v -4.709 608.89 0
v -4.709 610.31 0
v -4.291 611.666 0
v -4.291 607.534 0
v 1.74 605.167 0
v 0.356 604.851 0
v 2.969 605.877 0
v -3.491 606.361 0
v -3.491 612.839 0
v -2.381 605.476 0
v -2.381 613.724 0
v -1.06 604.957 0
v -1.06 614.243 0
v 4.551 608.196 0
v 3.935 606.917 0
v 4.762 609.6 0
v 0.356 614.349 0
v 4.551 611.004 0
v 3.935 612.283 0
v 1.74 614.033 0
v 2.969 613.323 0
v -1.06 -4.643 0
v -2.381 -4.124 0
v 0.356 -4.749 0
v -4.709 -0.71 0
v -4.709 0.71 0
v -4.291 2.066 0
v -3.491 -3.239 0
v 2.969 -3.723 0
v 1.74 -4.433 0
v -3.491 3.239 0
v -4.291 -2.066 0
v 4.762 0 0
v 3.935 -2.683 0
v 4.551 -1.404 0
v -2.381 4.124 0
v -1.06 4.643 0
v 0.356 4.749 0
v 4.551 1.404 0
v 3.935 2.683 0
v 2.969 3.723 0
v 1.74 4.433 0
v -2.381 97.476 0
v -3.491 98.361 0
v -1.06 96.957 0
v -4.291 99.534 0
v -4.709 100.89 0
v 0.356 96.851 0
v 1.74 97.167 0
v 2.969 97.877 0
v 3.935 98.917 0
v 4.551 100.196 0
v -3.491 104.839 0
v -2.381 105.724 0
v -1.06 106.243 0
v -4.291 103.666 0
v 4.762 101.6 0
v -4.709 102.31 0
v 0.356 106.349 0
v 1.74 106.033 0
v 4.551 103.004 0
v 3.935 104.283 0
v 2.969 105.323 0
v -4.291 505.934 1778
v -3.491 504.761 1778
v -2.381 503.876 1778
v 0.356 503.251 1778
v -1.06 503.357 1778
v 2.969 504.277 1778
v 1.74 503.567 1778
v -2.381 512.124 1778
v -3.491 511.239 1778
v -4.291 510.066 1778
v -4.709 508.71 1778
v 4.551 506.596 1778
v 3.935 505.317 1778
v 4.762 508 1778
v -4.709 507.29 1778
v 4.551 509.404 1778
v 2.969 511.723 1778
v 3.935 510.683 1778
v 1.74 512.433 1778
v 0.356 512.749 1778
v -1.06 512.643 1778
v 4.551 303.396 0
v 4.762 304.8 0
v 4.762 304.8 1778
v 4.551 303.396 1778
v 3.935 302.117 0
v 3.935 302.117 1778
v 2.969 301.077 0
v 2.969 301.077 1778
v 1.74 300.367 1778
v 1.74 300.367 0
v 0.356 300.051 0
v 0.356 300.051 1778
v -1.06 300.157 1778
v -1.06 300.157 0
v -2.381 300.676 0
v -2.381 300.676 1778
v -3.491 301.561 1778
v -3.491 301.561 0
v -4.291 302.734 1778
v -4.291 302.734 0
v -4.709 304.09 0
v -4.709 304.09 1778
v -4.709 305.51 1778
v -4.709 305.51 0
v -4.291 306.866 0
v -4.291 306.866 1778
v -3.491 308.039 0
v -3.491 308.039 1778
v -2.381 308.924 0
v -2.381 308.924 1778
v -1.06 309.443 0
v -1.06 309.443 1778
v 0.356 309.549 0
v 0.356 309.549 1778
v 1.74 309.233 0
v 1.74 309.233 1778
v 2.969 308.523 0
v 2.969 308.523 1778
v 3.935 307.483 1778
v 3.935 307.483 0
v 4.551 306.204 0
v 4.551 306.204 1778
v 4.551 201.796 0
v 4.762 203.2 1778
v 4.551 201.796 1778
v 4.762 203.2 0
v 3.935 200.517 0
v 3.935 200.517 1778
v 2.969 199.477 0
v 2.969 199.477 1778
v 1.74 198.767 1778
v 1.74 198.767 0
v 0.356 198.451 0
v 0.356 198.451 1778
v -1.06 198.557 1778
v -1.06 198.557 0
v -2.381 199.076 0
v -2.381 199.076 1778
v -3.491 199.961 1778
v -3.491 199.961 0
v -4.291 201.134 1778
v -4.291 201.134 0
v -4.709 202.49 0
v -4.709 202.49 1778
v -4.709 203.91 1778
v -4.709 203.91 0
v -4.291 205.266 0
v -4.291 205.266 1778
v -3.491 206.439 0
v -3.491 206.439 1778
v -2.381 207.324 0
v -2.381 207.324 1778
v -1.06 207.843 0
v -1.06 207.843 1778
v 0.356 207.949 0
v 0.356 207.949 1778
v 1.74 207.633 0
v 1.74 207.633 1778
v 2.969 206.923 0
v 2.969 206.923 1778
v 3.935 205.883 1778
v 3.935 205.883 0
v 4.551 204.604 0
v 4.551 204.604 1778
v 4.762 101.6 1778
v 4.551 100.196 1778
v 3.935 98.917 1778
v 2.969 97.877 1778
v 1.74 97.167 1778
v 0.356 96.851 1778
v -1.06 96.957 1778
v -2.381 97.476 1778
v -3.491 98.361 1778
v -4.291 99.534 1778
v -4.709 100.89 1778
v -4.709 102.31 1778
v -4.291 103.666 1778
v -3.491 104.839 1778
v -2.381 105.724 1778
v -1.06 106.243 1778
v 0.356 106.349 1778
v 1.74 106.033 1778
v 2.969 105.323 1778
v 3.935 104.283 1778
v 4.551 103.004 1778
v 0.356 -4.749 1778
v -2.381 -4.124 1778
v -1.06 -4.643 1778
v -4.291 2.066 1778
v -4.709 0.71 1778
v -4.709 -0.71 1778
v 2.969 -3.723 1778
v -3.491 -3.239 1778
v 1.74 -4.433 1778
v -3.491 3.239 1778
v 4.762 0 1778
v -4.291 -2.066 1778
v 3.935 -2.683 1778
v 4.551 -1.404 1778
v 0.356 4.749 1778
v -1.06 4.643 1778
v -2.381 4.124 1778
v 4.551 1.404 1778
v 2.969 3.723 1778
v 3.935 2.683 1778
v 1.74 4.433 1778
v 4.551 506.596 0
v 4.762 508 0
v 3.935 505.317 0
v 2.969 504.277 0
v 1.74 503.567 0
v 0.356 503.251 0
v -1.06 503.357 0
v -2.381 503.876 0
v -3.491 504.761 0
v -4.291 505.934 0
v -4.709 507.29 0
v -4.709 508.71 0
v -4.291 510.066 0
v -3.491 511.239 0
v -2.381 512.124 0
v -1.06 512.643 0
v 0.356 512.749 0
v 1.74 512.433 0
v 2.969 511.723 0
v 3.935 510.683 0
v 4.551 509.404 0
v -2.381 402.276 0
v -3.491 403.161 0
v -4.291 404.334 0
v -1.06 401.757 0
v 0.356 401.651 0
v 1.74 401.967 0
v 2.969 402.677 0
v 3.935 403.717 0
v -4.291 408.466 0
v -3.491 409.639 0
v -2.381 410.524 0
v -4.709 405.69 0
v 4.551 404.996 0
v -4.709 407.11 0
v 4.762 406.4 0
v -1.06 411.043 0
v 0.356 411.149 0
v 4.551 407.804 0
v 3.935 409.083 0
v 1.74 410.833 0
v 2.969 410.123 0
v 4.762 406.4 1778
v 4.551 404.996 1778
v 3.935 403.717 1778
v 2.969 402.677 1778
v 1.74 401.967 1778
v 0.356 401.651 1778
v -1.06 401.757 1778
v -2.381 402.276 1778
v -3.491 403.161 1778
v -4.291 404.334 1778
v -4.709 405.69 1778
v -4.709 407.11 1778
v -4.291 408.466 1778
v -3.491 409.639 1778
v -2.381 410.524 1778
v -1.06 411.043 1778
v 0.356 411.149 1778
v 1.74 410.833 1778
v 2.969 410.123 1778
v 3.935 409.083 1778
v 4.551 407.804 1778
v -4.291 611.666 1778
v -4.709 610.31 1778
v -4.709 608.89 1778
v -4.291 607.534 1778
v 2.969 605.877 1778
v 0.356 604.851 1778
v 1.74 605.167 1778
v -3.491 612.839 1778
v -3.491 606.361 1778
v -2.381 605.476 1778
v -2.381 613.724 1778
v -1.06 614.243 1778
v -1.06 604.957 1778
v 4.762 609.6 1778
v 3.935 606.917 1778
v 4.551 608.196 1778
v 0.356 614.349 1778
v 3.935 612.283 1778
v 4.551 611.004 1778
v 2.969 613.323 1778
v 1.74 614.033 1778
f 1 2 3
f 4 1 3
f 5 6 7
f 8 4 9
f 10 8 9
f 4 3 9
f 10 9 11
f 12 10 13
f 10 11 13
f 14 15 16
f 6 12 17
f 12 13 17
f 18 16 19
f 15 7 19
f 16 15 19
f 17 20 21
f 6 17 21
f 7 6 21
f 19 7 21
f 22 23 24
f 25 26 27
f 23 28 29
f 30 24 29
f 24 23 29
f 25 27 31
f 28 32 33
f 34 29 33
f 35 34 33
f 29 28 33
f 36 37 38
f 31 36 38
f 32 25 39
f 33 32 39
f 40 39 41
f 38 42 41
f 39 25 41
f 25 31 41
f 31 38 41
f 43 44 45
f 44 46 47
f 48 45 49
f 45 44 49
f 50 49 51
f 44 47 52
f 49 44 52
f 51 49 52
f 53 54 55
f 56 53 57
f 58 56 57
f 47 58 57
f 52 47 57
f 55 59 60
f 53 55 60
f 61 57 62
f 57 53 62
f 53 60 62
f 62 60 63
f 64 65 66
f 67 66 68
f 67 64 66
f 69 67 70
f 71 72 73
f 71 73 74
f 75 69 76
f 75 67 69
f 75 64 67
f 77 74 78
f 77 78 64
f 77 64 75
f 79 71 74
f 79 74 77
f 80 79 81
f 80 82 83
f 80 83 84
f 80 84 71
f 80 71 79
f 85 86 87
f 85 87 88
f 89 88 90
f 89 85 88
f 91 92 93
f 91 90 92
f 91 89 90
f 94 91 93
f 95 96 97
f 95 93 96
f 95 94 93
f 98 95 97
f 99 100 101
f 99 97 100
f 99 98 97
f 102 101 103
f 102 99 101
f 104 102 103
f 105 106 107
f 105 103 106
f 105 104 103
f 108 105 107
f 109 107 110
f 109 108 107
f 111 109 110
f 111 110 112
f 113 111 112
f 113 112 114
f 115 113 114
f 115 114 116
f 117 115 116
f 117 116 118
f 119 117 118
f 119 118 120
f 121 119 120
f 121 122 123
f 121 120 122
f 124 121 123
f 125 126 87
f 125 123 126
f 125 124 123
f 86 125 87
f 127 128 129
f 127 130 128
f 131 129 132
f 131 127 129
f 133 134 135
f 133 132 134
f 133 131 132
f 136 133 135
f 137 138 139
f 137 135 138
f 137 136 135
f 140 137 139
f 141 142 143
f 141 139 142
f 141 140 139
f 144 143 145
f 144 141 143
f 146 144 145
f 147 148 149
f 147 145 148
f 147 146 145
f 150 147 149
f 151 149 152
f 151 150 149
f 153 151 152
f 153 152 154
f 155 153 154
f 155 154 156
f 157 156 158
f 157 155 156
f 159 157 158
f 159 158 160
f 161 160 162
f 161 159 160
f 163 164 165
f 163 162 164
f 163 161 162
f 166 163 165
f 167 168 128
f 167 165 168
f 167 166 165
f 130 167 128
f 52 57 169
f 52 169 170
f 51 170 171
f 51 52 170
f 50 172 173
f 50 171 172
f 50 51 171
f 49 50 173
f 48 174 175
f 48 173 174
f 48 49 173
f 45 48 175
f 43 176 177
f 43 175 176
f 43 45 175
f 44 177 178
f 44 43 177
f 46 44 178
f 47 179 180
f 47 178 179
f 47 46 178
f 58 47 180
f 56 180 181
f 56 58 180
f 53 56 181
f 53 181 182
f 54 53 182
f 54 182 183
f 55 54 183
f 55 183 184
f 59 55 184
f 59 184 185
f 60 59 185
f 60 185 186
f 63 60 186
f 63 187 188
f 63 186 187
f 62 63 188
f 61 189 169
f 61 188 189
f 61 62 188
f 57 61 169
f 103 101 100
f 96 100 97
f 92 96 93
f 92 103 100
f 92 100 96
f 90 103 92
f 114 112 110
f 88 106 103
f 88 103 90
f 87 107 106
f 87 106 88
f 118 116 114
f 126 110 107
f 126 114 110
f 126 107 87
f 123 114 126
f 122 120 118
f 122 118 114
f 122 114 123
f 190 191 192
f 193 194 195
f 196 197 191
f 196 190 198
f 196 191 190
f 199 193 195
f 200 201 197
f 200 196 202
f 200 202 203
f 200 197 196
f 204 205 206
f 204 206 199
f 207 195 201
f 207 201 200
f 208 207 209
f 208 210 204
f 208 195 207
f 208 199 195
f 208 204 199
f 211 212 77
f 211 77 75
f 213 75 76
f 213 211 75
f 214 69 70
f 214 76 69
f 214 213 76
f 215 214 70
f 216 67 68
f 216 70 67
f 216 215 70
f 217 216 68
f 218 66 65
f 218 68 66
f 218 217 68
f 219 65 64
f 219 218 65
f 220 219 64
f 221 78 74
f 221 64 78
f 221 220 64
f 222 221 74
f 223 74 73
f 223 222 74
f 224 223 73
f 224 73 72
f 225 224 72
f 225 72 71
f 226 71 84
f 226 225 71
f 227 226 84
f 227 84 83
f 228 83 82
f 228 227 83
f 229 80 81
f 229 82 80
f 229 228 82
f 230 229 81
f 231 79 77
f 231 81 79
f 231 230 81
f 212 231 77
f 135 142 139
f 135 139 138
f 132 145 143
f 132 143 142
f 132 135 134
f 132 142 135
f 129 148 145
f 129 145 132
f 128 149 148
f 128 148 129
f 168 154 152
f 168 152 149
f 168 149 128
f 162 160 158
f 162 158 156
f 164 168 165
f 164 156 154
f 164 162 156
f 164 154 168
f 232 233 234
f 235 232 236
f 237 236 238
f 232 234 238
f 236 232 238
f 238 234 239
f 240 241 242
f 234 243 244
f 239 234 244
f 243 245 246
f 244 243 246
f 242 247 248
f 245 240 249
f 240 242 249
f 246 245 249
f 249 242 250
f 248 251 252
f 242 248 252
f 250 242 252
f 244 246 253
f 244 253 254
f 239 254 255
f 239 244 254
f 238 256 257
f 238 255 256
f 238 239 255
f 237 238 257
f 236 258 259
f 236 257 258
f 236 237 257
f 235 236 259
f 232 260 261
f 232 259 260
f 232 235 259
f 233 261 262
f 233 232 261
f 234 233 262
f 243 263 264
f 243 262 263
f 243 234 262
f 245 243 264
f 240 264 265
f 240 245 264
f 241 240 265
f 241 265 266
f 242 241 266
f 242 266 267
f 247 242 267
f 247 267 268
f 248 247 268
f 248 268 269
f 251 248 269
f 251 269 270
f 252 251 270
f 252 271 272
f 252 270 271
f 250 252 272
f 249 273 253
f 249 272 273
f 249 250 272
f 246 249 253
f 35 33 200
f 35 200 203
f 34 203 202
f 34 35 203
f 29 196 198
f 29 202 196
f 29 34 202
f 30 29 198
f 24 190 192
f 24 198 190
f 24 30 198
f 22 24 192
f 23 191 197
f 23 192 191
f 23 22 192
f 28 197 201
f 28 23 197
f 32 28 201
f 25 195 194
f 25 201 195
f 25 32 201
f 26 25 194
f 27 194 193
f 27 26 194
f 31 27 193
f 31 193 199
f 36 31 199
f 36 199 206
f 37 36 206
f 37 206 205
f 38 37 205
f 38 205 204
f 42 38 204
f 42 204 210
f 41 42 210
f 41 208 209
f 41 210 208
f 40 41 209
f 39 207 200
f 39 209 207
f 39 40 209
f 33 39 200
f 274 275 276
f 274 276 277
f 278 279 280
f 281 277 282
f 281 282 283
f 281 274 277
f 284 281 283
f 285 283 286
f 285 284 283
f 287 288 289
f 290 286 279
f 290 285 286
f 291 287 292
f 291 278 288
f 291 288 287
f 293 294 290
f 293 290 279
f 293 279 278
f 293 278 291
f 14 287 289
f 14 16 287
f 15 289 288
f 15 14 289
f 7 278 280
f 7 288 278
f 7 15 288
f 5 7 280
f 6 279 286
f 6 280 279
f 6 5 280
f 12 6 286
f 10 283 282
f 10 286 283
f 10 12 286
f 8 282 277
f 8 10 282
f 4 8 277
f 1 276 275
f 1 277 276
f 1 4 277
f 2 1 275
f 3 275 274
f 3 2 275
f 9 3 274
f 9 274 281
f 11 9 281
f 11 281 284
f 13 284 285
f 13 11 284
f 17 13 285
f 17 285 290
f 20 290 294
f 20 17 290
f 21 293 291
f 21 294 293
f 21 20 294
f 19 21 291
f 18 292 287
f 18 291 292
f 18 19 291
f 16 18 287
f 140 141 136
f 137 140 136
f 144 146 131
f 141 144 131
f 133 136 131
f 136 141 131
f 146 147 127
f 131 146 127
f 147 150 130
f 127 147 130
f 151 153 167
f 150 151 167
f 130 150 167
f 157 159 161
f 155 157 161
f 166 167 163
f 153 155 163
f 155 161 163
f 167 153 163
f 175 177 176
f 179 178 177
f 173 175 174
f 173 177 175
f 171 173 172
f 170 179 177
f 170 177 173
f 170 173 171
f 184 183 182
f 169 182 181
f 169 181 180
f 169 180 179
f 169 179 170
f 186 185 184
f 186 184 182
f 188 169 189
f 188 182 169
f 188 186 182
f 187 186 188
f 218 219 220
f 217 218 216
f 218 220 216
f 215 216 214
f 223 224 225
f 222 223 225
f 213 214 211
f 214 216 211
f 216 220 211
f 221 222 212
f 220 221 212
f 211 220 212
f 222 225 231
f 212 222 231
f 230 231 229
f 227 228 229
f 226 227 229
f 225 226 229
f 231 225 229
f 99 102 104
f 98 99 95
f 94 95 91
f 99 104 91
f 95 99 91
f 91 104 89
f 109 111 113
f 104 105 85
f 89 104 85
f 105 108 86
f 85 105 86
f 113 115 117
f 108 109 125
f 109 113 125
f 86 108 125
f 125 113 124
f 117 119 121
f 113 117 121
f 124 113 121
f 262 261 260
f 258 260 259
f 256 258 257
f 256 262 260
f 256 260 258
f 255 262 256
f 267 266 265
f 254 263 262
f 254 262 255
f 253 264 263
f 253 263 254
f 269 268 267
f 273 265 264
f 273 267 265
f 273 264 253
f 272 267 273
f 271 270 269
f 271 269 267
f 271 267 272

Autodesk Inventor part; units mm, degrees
ref_plane "YZ Plane" through (0, 0, 0) normal (1, 0, 0) x (0, 1, 0)
ref_plane "XZ Plane" through (0, 0, 0) normal (0, 1, 0) x (-1, 0, 0)
ref_plane "XY Plane" through (0, 0, 0) normal (0, 0, 1) x (1, 0, 0)
sketch "Sketch1" plane through (0, 0, 0) normal (0, 0, 1) x (1, 0, 0)
  circle A0 centre (0, 0) radius 4.7625
  circle A1 centre (0, 101.6) radius 4.7625
  circle A2 centre (0, 203.2) radius 4.7625
  circle A3 centre (0, 304.8) radius 4.7625
  circle A4 centre (0, 406.4) radius 4.7625
  circle A5 centre (0, 508) radius 4.7625
  circle A6 centre (0, 609.6) radius 4.7625
  dimension "d0" = 9.525
  dimension "d3" = 101.6
  dimension "d4" = 101.6
  dimension "d5" = 101.6
  dimension "d6" = 101.6
  dimension "d7" = 101.6
  dimension "d10" = 101.6
extrude "Extrusion2" add sketch "Sketch1" along normal blind 1778
properties part number "Front Cable" material "Steel, Wrought"
